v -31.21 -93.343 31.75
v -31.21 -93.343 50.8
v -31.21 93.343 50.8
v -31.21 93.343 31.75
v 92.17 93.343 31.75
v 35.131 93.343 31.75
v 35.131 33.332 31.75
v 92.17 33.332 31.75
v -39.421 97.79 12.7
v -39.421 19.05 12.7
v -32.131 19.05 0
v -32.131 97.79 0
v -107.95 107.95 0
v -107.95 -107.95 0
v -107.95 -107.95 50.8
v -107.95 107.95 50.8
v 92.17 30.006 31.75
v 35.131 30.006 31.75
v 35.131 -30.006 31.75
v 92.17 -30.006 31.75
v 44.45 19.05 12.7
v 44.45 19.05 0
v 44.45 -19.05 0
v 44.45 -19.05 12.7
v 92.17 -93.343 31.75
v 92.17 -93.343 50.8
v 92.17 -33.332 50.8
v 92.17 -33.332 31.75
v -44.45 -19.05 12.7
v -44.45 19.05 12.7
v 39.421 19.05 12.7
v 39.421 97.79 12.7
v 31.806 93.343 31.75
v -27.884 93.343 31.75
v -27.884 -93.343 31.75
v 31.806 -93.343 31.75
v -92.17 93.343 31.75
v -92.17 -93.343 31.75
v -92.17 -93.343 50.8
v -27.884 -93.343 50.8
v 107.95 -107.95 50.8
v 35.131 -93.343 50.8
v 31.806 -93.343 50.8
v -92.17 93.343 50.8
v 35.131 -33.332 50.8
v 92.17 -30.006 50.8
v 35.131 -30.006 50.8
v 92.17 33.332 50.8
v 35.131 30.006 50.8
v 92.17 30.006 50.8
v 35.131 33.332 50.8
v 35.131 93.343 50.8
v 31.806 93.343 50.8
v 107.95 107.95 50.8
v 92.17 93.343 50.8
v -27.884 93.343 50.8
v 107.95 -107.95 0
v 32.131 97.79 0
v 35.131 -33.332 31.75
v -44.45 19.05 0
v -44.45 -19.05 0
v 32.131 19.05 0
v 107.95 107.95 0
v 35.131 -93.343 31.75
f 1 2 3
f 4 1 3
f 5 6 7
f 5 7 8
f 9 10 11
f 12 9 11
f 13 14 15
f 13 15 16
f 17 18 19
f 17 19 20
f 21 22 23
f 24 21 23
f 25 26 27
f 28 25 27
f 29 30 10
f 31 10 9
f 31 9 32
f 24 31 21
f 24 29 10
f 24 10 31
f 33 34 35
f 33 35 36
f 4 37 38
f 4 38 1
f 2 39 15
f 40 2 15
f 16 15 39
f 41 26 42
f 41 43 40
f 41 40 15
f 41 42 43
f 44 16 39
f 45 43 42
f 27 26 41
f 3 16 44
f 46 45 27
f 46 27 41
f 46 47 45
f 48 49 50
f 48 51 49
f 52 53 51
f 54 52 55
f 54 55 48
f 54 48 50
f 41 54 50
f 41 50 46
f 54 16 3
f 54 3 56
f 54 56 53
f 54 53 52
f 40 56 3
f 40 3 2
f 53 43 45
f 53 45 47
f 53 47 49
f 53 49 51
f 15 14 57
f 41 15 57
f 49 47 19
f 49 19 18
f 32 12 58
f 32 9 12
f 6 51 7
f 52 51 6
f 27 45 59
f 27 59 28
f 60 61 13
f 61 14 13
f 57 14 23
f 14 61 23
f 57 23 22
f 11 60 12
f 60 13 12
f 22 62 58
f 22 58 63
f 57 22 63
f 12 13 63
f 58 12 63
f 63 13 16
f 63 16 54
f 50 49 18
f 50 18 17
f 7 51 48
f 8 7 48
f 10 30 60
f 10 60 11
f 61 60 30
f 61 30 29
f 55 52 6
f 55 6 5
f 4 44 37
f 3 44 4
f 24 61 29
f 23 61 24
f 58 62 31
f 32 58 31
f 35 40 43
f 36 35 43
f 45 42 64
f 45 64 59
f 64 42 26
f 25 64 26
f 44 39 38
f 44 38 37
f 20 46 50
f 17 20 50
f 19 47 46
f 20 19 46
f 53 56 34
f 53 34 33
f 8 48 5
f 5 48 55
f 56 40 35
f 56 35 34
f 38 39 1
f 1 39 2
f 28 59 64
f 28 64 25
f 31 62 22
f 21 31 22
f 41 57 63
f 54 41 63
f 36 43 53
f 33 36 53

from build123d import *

# Parameters (mm, degrees)
F0_W     = 215.9
F0_H     = 215.9
F1_DEPTH = 50.8
F2_W     = 60.96
F2_H     = 186.68595
F2_W_2   = 59.69
F2_W_3   = 57.038961
F2_H_2   = 60.011442
F3_DEPTH = 19.05
F4_W     = 88.9
F4_H     = 38.1
F5_DEPTH = 12.7
F7_DEPTH = 78.74


with BuildPart() as f1:
    # F0 (on Top) → F1 (new body)
    with BuildSketch(Plane.XY):
        Rectangle(F0_W, F0_H)
    extrude(amount=F1_DEPTH)

    # F2 (on face) → F3 (cut)
    with BuildSketch(Plane.XY.offset(50.8)):
        with Locations((-61.690293, 0)):
            Rectangle(F2_W, F2_H)
        with Locations((1.960519, 0)):
            Rectangle(F2_W_2, F2_H)
        with Locations((63.650813, 63.337254)):
            Rectangle(F2_W_3, F2_H_2)
        with Locations((63.650813, 0)):
            Rectangle(F2_W_3, F2_H_2)
        with Locations((63.650813, -63.337254)):
            Rectangle(F2_W_3, F2_H_2)
    extrude(amount=-F3_DEPTH, mode=Mode.SUBTRACT)

    # F4 (on face) → F5 (cut)
    with BuildSketch(Plane(origin=(0, 0, 0), x_dir=(1, 0, 0), z_dir=(0, 0, -1))):
        Rectangle(F4_W, F4_H)
    extrude(amount=-F5_DEPTH, mode=Mode.SUBTRACT)

    # F6 (on face) → F7 (cut)
    with BuildSketch(Plane.XZ.offset(-19.05)):
        Polygon((-32.131, 0), (0, 0), (32.131, 0), (39.4208, 12.7), (-39.4208, 12.7), align=None)
    extrude(amount=-F7_DEPTH, mode=Mode.SUBTRACT)


solid = f1.part
